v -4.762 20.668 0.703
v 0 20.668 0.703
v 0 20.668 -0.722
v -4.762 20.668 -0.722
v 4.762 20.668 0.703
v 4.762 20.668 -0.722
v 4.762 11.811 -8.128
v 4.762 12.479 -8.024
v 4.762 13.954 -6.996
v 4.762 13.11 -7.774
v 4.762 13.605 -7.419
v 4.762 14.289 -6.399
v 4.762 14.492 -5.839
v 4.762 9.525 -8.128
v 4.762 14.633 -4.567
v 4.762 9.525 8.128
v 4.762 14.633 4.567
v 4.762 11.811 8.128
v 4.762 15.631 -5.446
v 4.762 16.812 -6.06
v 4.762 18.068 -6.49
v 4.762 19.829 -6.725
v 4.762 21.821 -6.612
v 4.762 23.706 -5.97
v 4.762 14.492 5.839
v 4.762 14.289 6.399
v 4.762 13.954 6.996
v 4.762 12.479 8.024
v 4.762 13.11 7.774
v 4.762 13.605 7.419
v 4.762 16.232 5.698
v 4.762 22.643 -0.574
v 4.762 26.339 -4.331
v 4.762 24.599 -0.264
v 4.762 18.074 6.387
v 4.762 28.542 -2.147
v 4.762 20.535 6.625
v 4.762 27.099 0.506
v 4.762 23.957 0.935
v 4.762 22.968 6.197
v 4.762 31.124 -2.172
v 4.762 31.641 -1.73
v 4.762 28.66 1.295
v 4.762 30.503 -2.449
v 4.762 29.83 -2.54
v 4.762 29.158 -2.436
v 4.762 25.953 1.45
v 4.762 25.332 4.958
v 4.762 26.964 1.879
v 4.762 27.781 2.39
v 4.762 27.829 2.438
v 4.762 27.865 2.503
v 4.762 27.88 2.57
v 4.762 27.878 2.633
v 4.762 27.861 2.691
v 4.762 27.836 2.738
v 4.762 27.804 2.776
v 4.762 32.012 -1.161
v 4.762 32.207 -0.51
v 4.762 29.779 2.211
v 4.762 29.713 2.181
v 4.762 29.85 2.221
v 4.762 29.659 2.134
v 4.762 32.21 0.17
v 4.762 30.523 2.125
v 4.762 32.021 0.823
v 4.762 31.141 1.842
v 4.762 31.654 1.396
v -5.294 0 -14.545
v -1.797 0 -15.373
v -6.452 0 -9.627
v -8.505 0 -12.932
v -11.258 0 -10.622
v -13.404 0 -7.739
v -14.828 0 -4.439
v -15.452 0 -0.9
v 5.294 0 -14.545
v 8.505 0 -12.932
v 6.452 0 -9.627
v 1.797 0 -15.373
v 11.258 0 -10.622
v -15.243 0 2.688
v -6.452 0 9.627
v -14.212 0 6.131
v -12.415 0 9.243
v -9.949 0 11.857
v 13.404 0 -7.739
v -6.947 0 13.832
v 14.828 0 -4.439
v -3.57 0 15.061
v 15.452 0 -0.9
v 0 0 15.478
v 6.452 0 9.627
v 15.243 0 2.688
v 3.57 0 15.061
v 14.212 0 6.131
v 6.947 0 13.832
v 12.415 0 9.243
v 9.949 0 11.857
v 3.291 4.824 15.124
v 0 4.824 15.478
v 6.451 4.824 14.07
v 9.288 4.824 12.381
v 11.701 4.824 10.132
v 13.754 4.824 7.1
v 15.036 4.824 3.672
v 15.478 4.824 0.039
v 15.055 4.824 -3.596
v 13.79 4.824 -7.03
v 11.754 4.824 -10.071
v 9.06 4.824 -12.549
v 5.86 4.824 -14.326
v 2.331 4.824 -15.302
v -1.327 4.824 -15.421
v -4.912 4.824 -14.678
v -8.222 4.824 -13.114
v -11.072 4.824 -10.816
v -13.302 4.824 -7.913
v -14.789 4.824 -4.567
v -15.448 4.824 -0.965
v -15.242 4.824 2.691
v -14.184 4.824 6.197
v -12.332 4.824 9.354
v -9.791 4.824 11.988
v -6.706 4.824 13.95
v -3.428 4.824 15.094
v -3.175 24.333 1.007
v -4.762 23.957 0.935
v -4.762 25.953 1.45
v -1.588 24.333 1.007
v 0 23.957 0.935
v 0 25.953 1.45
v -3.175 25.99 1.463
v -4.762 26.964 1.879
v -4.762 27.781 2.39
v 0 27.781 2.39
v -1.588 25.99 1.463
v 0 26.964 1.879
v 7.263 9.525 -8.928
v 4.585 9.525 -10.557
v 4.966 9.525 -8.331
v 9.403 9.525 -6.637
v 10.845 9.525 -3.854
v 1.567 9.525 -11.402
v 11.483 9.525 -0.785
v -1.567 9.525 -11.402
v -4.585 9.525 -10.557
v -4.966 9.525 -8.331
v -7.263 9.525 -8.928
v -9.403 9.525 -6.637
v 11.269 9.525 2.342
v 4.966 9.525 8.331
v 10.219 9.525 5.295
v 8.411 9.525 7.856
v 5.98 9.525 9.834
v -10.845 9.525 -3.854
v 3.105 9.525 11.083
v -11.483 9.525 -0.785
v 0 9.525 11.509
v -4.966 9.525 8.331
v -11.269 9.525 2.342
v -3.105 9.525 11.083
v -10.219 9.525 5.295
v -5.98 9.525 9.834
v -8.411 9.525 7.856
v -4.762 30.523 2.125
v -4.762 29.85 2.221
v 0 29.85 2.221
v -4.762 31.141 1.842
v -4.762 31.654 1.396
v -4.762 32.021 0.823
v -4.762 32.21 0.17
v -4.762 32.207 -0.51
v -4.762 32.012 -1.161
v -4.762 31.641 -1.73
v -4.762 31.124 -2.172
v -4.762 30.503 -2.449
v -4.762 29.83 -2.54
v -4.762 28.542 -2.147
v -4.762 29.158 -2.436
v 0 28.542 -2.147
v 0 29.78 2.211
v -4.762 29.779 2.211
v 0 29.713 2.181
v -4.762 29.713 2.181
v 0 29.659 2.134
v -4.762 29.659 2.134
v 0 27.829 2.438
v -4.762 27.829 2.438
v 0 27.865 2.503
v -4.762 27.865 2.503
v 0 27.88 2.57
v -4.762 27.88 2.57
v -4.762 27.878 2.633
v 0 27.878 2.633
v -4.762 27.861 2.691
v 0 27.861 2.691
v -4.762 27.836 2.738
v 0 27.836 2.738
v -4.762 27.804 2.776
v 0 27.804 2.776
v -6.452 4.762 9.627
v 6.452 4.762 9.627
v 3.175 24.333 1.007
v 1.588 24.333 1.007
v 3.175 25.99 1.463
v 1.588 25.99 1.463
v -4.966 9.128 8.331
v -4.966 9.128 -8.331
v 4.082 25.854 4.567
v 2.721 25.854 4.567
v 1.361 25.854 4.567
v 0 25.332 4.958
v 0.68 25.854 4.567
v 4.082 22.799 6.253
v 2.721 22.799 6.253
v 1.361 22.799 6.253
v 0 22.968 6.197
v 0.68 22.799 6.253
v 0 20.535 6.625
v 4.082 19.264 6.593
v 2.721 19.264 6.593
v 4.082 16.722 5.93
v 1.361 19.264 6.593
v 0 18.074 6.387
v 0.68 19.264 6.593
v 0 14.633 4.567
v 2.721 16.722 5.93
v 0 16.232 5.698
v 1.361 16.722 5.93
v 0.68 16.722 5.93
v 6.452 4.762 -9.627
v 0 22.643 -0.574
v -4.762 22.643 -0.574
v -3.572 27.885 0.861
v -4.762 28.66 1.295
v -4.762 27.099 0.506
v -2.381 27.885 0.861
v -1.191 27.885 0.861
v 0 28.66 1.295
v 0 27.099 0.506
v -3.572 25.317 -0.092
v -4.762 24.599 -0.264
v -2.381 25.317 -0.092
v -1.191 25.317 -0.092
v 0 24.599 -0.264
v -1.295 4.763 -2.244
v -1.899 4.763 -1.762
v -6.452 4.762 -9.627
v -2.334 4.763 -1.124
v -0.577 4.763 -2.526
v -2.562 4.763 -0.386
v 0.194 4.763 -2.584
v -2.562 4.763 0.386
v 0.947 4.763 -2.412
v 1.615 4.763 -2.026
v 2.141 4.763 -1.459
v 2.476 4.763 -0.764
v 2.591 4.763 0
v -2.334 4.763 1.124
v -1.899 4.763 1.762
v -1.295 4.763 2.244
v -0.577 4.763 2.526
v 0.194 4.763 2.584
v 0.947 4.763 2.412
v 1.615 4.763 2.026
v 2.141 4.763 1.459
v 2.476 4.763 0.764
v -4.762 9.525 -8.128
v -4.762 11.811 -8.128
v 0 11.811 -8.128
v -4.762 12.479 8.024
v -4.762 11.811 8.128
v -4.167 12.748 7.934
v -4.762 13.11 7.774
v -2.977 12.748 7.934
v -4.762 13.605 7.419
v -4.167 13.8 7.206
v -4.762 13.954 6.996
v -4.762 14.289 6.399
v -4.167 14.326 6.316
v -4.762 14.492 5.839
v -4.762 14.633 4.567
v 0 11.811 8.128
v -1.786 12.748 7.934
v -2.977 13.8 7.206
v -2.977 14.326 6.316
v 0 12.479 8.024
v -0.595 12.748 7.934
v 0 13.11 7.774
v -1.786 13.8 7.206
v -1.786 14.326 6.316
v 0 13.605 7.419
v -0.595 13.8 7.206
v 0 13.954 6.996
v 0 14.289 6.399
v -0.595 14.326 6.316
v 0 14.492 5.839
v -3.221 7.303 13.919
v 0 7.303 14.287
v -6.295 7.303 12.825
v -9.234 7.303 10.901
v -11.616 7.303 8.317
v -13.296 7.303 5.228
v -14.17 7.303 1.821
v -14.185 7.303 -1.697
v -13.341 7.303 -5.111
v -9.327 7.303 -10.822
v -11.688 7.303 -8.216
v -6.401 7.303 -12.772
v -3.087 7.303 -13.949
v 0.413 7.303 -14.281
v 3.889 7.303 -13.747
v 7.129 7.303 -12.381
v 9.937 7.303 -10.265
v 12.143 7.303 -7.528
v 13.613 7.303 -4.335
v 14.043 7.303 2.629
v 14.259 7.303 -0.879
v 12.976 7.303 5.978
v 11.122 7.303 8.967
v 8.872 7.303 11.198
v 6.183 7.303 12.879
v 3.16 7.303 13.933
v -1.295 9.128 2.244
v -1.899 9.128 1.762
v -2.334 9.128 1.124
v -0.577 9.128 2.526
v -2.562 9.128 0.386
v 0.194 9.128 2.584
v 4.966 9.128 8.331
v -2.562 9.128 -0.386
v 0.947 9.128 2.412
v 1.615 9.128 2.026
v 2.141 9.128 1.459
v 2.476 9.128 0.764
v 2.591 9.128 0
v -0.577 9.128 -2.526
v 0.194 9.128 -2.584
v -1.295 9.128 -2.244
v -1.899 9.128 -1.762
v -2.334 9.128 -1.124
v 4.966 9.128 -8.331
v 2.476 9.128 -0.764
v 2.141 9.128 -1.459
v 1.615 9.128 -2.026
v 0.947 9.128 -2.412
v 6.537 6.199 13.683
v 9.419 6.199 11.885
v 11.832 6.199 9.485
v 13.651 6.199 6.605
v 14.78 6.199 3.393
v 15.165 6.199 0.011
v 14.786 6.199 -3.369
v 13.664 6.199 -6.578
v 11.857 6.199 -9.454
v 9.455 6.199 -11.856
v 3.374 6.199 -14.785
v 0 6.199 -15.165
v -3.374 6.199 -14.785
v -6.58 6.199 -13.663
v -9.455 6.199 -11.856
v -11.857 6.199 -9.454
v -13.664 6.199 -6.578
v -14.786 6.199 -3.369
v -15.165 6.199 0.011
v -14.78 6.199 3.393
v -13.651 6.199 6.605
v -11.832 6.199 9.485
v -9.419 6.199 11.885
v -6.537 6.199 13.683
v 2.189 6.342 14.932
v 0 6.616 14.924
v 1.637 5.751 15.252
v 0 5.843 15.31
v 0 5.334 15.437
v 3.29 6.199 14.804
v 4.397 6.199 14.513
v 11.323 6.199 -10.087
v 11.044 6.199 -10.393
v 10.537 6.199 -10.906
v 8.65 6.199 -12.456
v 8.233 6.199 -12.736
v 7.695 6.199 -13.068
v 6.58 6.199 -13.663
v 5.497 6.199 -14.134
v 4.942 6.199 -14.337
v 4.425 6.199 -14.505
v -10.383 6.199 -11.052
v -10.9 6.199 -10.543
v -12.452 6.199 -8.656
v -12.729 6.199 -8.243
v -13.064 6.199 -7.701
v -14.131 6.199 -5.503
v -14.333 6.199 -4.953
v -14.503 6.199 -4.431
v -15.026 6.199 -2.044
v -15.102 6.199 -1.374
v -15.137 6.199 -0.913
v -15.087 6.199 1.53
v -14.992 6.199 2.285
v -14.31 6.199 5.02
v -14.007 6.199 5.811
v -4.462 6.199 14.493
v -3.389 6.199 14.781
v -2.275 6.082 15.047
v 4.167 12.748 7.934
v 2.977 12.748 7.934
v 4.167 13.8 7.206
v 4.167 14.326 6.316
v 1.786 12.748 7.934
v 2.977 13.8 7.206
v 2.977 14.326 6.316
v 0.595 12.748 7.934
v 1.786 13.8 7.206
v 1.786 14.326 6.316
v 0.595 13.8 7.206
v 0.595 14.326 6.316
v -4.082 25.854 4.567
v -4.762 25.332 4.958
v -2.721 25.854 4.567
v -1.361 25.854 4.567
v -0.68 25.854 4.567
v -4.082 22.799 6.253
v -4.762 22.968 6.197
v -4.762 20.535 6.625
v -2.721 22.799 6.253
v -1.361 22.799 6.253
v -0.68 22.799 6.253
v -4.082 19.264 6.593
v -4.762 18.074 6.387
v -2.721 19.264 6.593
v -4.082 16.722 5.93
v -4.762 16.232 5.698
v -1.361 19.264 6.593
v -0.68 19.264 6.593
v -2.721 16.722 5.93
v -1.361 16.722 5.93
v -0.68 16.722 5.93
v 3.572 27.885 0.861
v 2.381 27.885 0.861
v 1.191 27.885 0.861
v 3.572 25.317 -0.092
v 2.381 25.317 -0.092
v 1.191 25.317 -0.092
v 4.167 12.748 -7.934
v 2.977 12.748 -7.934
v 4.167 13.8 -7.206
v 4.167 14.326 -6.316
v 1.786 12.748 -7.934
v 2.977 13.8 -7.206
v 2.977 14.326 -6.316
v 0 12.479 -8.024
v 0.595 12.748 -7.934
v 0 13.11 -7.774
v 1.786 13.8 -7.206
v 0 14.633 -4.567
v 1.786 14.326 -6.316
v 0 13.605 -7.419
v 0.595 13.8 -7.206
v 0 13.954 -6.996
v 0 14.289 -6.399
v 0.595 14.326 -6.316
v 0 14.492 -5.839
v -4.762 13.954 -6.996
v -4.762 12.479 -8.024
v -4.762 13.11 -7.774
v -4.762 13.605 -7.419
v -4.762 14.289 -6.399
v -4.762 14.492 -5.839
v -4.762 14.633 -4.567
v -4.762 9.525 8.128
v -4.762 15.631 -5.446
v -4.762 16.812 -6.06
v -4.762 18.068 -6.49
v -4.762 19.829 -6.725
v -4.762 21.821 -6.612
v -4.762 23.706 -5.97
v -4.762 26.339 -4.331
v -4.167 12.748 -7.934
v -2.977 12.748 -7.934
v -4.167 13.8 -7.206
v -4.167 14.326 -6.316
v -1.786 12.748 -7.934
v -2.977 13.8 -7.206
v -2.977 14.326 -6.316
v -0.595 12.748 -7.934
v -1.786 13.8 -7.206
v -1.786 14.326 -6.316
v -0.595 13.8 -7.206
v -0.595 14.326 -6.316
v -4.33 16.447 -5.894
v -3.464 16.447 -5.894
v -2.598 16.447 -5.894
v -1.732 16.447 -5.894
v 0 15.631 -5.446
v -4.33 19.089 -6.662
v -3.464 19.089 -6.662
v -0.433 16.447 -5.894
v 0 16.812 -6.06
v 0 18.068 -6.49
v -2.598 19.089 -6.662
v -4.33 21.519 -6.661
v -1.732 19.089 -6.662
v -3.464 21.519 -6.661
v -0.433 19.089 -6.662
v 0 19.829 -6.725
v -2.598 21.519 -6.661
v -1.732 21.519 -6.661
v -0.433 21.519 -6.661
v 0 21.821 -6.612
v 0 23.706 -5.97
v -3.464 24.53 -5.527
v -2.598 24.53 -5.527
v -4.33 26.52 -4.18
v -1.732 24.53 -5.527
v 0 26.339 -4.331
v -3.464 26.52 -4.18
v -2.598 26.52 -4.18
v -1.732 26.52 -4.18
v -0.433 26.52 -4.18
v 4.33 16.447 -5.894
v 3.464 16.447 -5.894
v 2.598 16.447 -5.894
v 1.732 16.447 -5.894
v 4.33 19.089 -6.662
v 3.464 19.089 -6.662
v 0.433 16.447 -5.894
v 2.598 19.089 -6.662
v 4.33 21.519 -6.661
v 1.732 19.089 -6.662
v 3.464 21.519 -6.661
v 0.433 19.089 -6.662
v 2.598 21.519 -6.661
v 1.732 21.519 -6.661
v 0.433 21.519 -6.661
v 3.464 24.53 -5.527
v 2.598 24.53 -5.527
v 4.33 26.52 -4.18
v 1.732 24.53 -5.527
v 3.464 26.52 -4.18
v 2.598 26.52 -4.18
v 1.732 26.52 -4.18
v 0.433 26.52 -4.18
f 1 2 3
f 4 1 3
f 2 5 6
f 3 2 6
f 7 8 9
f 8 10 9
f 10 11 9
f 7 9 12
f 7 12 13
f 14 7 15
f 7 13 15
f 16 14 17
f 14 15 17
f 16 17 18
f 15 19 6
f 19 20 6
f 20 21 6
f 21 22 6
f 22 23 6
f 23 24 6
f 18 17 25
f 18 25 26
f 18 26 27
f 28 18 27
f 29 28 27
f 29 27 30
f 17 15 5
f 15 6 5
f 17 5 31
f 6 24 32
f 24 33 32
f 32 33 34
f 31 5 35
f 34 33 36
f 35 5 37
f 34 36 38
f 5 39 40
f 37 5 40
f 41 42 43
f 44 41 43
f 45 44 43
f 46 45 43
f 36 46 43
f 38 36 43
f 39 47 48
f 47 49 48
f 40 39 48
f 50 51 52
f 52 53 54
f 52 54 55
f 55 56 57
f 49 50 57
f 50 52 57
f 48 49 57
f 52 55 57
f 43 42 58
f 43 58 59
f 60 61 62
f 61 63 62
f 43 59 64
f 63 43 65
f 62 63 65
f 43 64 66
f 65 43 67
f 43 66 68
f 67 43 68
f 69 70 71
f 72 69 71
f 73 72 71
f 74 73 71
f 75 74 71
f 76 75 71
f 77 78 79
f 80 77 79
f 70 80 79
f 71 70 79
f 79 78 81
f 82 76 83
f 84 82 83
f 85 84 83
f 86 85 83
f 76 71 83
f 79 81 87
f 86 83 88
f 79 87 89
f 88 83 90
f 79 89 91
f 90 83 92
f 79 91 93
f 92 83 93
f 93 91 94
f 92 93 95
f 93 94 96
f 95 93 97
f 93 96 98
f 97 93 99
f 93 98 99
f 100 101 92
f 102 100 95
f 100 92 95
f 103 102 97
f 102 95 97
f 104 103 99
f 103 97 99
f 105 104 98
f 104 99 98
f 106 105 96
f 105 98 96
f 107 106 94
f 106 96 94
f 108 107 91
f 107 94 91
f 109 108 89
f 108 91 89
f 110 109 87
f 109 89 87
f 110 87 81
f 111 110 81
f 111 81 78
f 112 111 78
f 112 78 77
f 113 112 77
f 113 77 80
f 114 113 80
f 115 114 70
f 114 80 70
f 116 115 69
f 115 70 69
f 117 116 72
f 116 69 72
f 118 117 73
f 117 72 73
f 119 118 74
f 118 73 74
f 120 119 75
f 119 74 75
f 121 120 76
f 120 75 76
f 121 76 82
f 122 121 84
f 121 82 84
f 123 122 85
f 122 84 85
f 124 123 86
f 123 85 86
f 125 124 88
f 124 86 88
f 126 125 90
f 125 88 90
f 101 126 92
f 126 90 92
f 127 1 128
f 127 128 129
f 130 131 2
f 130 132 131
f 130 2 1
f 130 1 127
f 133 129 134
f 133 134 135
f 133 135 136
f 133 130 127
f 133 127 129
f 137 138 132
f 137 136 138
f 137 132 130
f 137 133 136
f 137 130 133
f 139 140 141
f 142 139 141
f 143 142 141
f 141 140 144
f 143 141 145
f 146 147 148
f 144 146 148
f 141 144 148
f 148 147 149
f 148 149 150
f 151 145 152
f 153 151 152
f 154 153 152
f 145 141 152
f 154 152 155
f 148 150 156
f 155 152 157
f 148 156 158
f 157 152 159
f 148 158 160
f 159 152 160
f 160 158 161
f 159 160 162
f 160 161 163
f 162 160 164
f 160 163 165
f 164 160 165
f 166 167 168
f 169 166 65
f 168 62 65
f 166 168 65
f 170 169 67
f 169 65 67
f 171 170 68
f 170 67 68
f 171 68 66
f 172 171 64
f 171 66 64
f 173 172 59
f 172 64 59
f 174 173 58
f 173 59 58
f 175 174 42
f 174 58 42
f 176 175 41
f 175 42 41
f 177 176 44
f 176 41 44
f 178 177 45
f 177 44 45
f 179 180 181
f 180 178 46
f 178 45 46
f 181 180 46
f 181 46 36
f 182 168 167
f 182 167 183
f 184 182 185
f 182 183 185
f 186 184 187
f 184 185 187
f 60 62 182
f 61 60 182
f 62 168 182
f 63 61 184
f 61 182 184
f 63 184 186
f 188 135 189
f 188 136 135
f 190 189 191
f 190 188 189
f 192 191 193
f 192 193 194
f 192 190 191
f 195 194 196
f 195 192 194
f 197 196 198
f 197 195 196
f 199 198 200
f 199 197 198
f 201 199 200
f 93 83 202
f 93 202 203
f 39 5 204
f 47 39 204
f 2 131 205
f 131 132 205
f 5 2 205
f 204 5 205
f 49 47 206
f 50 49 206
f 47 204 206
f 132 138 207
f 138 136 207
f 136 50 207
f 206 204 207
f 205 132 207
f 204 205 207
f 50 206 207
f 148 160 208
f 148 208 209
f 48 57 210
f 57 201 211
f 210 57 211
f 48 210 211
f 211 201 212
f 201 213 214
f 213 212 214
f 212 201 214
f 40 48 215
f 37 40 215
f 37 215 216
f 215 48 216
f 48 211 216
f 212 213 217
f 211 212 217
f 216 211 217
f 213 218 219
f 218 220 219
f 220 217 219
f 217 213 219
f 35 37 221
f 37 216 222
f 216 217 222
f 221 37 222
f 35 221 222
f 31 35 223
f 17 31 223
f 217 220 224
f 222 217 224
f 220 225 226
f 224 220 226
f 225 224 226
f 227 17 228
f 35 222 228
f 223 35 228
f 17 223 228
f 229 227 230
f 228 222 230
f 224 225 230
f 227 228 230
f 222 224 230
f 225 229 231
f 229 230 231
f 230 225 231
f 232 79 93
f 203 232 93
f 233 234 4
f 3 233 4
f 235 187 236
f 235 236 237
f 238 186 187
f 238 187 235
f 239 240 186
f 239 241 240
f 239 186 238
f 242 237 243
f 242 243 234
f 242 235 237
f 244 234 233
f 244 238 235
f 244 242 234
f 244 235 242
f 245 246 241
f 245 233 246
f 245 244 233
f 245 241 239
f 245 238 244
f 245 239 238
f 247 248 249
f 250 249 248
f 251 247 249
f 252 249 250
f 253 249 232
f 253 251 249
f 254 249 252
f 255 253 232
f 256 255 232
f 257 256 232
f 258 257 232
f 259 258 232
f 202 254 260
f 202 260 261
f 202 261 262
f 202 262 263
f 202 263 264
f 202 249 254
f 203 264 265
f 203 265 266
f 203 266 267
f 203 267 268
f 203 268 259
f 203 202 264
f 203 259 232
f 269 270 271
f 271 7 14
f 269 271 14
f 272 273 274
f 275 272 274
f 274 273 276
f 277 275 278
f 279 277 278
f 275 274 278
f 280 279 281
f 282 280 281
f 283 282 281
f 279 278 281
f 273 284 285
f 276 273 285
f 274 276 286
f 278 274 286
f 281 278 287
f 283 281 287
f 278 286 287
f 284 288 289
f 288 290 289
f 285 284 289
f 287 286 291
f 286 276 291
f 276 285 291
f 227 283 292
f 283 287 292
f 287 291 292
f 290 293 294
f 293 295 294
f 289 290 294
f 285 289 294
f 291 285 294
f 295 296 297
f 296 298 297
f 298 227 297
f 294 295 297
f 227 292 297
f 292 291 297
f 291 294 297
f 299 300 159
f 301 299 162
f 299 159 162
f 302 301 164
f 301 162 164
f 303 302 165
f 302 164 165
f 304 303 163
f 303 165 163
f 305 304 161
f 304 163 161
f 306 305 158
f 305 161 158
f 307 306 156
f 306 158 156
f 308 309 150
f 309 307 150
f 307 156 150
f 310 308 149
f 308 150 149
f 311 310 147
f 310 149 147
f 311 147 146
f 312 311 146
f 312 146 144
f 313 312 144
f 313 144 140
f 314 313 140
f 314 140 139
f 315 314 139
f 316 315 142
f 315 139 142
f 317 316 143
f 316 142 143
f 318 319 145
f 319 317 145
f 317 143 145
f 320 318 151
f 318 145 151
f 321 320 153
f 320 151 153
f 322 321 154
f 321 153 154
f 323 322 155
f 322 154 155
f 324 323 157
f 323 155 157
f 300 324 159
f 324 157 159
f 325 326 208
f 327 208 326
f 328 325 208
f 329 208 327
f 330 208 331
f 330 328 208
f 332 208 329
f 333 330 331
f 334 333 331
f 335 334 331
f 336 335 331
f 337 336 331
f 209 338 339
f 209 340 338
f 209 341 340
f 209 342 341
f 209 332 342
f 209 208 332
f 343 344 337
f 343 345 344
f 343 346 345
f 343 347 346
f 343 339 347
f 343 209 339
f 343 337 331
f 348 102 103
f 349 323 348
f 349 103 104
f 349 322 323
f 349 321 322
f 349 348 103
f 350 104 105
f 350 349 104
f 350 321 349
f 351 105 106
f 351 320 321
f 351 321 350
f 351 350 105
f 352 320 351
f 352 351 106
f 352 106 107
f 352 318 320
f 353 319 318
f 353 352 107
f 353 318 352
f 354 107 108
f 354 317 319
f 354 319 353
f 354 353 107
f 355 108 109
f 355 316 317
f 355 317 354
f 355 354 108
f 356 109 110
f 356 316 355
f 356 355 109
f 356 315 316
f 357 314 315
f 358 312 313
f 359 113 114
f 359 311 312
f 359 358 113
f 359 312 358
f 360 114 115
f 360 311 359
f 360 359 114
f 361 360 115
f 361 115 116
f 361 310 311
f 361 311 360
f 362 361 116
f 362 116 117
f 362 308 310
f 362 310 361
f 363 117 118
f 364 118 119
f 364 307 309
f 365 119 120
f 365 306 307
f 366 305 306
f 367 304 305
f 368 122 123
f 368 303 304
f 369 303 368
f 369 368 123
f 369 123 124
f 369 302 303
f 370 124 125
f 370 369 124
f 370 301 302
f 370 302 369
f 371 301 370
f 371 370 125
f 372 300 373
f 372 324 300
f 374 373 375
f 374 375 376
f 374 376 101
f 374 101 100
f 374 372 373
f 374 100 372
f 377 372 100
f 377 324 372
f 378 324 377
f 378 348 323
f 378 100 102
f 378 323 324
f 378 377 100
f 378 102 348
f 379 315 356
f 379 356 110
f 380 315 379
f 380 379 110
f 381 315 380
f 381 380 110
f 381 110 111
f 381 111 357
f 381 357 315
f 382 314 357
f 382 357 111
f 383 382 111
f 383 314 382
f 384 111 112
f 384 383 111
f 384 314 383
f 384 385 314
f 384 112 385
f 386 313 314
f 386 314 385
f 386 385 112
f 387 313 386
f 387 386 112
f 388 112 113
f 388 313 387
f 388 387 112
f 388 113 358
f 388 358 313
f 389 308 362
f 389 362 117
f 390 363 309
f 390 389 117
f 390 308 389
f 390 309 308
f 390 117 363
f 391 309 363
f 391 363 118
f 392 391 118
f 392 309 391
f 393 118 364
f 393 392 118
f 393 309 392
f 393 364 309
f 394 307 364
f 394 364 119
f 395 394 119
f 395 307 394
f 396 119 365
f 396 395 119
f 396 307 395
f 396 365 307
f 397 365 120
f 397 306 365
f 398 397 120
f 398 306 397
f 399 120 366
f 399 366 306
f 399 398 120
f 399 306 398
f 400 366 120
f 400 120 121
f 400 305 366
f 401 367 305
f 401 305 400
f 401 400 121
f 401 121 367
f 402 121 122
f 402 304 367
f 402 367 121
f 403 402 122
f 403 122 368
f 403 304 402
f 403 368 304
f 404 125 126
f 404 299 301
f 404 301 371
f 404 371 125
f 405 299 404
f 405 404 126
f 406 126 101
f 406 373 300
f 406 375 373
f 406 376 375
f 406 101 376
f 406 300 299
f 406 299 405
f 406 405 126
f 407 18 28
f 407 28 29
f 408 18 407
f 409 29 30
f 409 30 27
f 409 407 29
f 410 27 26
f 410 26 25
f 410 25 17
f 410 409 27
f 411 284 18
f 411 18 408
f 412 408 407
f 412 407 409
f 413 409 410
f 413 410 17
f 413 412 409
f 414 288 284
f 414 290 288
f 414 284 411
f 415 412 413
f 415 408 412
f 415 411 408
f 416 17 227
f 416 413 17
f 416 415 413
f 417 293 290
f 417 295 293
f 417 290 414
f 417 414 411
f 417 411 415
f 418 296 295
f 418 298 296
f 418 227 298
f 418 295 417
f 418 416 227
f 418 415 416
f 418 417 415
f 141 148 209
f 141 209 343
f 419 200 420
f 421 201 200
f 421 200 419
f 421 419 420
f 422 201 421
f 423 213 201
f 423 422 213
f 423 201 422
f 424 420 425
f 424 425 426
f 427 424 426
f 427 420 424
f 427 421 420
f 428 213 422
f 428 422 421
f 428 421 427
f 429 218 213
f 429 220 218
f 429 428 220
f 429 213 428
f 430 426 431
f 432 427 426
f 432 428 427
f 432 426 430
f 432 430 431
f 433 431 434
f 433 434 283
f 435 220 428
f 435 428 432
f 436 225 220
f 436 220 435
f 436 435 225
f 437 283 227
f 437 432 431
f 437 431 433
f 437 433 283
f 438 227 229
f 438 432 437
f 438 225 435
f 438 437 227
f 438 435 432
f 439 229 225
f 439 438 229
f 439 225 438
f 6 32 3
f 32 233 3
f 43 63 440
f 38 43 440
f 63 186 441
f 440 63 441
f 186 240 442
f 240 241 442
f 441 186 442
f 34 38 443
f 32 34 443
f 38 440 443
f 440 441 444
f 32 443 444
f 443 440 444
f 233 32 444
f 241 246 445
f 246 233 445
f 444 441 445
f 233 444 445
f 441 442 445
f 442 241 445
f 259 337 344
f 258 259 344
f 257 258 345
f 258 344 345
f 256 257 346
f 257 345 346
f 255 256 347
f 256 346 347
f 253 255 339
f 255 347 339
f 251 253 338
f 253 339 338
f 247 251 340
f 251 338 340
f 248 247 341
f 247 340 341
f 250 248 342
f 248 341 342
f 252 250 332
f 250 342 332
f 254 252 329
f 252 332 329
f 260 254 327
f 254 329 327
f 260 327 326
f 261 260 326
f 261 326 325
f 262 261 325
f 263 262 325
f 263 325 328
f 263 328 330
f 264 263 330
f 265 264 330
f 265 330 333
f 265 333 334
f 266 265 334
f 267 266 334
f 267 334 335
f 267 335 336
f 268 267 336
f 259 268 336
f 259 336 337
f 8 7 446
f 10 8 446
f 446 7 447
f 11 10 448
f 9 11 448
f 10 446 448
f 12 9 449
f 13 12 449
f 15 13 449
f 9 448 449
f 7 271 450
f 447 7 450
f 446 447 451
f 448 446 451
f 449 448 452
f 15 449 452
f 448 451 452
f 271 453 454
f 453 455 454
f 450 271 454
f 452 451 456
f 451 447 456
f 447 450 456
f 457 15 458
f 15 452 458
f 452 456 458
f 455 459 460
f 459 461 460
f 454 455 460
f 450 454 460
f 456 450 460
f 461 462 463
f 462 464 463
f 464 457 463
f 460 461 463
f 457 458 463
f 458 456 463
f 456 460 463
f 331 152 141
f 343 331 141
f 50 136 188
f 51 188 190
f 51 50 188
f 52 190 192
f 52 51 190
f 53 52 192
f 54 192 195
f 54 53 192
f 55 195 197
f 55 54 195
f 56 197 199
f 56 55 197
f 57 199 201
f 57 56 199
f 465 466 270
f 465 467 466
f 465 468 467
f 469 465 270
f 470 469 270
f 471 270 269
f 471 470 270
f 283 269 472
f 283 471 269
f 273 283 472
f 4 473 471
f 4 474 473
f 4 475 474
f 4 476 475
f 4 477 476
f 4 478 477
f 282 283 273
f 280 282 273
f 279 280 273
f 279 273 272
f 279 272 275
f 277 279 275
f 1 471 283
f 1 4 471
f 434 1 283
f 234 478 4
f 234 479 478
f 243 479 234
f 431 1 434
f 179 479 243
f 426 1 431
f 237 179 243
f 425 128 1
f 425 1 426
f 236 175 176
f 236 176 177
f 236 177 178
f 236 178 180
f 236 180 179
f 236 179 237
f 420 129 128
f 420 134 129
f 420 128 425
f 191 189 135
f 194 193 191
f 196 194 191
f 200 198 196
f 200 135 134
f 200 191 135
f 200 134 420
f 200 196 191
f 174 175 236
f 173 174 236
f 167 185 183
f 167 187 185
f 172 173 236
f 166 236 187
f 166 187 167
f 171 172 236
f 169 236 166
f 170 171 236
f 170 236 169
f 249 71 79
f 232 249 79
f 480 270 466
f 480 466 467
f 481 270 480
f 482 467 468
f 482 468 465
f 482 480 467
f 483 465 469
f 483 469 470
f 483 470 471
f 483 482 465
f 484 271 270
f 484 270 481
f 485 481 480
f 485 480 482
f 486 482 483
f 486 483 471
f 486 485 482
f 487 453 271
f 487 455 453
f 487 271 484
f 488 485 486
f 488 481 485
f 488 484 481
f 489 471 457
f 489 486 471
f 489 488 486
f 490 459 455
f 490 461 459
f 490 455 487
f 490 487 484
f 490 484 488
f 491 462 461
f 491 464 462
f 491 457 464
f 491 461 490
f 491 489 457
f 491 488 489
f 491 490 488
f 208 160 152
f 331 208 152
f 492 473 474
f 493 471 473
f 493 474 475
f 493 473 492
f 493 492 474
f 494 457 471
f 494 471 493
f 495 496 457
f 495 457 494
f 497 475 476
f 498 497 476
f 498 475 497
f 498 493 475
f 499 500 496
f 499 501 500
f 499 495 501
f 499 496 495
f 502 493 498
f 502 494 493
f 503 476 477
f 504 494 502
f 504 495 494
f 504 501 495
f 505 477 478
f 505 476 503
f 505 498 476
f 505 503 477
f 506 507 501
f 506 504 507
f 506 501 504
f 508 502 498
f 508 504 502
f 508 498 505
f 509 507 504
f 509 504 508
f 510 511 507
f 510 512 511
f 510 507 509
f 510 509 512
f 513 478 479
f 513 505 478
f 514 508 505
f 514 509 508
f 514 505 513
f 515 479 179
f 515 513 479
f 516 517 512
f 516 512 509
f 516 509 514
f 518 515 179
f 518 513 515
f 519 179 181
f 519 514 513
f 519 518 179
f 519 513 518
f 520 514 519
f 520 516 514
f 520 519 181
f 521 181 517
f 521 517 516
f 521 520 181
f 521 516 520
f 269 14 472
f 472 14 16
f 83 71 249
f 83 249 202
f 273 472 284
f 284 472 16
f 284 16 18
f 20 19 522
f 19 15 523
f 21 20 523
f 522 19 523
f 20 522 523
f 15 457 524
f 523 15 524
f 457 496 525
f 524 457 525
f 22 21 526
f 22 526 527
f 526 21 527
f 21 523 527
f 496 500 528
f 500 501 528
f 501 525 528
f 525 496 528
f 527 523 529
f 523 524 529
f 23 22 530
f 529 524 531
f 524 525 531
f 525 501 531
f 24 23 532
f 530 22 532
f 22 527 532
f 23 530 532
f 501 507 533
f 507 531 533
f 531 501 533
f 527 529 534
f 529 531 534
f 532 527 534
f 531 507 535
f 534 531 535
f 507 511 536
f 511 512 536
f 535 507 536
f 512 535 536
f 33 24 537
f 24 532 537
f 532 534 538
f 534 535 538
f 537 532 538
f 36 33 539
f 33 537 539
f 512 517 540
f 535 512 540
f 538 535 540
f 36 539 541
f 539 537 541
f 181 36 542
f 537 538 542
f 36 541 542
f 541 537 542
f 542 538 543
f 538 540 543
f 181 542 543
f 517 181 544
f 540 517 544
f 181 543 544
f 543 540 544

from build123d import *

# Parameters (mm, degrees)
SKETCH1_R                  = 15.478125
BOSS_EXTRUDE1_DEPTH        = 6.35
FILLET1_R                  = 3.175
SKETCH3_W                  = 12.9032
SKETCH3_H                  = 19.2532
CUT_EXTRUDE1_DEPTH         = 4.7625
F_6_0_204_DIAMETER_HOLE1_D = 5.1816
BOSS_EXTRUDE2_DEPTH        = 4.7625
SKETCH7_W                  = 9.9314
SKETCH7_H                  = 16.6624
CUT_EXTRUDE2_DEPTH         = 0.396875
FILLET2_R                  = 0.254


with BuildPart() as part:
    # Sketch1 → Boss-Extrude1 (new body)
    with BuildSketch(Plane(origin=(0, 0, 0), x_dir=(1, 0, 0), z_dir=(0, 1, 0))):
        with Locations(Location((0, 0, 0), (0, 0, 270))):
            Circle(SKETCH1_R)
    extrude(amount=BOSS_EXTRUDE1_DEPTH)

    # Sketch2 → Revolve1 (revolve)
    with BuildSketch(Plane.XY, mode=Mode.PRIVATE) as revolve1_sk:
        Polygon((-15.478125, 6.35), (-11.509375, 9.525), (0, 9.525), (0, 6.35), align=None)
    revolve(revolve1_sk.sketch.rotate(Axis((0, 9.525, 0), (0, -1, 0)), 270), axis=Axis((0, 9.525, 0), (0, -1, 0)))

    # Fillet1
    fillet1_edges = [part.edges().sort_by_distance(p)[0] for p in [
        (0, 6.35, -15.478125),
    ]]
    fillet(fillet1_edges, radius=FILLET1_R)

    # Sketch3 → Cut-Extrude1 (cut)
    with BuildSketch(Plane.XZ):
        Rectangle(SKETCH3_W, SKETCH3_H)
    extrude(amount=-CUT_EXTRUDE1_DEPTH, mode=Mode.SUBTRACT)

    # #6 (0.204) Diameter Hole1 (through all)
    with Locations(Plane(origin=(0, 4.7625, 0), x_dir=(-1, 0, 0), z_dir=(0, -1, 0))):
        with Locations((0, 0)):
            Hole(F_6_0_204_DIAMETER_HOLE1_D / 2)

    # Sketch7 → Cut-Extrude2 (cut)
    with BuildSketch(Plane(origin=(0, 9.525, 0), x_dir=(1, 0, 0), z_dir=(0, 1, 0))):
        Rectangle(SKETCH7_W, SKETCH7_H)
    extrude(amount=-CUT_EXTRUDE2_DEPTH, mode=Mode.SUBTRACT)


with BuildPart() as body_2:
    # Sketch6 → Boss-Extrude2 (new, symmetric)
    with BuildSketch(Plane(origin=(0, 0, 0), x_dir=(0, 0, -1), z_dir=(1, 0, 0))):
        with BuildLine():
            Line((8.128, 9.525), (-8.128, 9.525))
            Line((-8.128, 9.525), (-8.128, 11.811))
            add(Edge.make_bspline(
                [(-8.128, 11.811), (-8.128, 11.964852962), (-8.088079655, 12.287813543), (-7.921013245, 12.821816315), (-7.660538801, 13.367431776), (-7.237258139, 13.799641498), (-6.787221355, 14.093437893), (-6.359189094, 14.317391584), (-5.631174455, 14.592045574), (-5.018563189, 14.606056956), (-4.567466527, 14.633133736)],
                knots=[0, 0, 0, 0, 0.091821989, 0.189225593, 0.331099539, 0.444001016, 0.541829554, 0.647961243, 0.729130912, 1, 1, 1, 1], degree=3))
            add(Edge.make_bspline(
                [(-2.577145361, 28.011214997), (-3.249090894, 27.302251357), (-4.468621829, 26.127878484), (-5.648431076, 24.316983957), (-6.331714614, 22.737632088), (-6.634320692, 21.102092731), (-6.672666305, 19.026055349), (-6.063547868, 16.704846476), (-5.151631515, 15.238050676), (-4.567466527, 14.633133736)],
                knots=[0, 0, 0, 0, 0.193953117, 0.33367751, 0.425378511, 0.533262364, 0.661023728, 0.834598476, 1, 1, 1, 1], degree=3))
            add(Edge.make_bspline(
                [(-0.702792016, 20.668406325), (-0.674457315, 21.895013355), (-0.802393308, 23.705263943), (-1.470587145, 26.198121163), (-2.064569458, 27.420151061), (-2.577145361, 28.011214997)],
                knots=[0, 0, 0, 0, 0.47713647, 0.699696539, 1, 1, 1, 1], degree=3))
            Line((-0.702792016, 20.668406325), (0.721519658, 20.668406325))
            add(Edge.make_bspline(
                [(-2.2178236, 29.730237714), (-1.62152233, 29.238401482), (-0.995355422, 28.244447346), (-0.327091027, 26.70344874), (0.440040308, 24.337086176), (0.650497256, 22.227916002), (0.721519658, 20.668406325)],
                knots=[0, 0, 0, 0, 0.236294145, 0.354063326, 0.517816971, 1, 1, 1, 1], degree=3))
            ThreePointArc((-2.2178236, 29.730237714), (0.784549677, 32.149320423), (2.147254802, 28.542487853))
            add(Edge.make_bspline(
                [(4.567466527, 14.633133736), (4.865331001, 14.934983024), (5.40910627, 15.474406408), (5.969261062, 16.573568683), (6.457374558, 17.72899292), (6.744619539, 19.444714149), (6.78563689, 21.198431759), (6.338072925, 23.051026424), (5.668765308, 24.293311401), (4.965580349, 25.505426492), (4.301495841, 26.419369028), (3.305311631, 27.453348329), (2.598548076, 28.097487401), (2.147254802, 28.542487853)],
                knots=[0, 0, 0, 0, 0.080158756, 0.141654265, 0.230515184, 0.314788546, 0.467006335, 0.556741952, 0.669627033, 0.730468918, 0.820323986, 0.880912548, 1, 1, 1, 1], degree=3))
            add(Edge.make_bspline(
                [(8.128, 11.811), (8.128, 11.964852962), (8.088079655, 12.287813543), (7.921013245, 12.821816315), (7.660538801, 13.367431776), (7.237258139, 13.799641498), (6.787221355, 14.093437893), (6.359189094, 14.317391584), (5.631174455, 14.592045574), (5.018563189, 14.606056956), (4.567466527, 14.633133736)],
                knots=[0, 0, 0, 0, 0.091821989, 0.189225593, 0.331099539, 0.444001016, 0.541829554, 0.647961243, 0.729130912, 1, 1, 1, 1], degree=3))
            Line((8.128, 11.811), (8.128, 9.525))
        make_face()
    extrude(amount=BOSS_EXTRUDE2_DEPTH, both=True)

    # Fillet2
    fillet2_edges = [body_2.edges().sort_by_distance(p)[0] for p in [
        (2.38125, 28.011214997, 2.577145361),
        (-2.38125, 29.730237714, 2.2178236),
    ]]
    fillet(fillet2_edges, radius=FILLET2_R)


solid = Compound([part.part, body_2.part])
